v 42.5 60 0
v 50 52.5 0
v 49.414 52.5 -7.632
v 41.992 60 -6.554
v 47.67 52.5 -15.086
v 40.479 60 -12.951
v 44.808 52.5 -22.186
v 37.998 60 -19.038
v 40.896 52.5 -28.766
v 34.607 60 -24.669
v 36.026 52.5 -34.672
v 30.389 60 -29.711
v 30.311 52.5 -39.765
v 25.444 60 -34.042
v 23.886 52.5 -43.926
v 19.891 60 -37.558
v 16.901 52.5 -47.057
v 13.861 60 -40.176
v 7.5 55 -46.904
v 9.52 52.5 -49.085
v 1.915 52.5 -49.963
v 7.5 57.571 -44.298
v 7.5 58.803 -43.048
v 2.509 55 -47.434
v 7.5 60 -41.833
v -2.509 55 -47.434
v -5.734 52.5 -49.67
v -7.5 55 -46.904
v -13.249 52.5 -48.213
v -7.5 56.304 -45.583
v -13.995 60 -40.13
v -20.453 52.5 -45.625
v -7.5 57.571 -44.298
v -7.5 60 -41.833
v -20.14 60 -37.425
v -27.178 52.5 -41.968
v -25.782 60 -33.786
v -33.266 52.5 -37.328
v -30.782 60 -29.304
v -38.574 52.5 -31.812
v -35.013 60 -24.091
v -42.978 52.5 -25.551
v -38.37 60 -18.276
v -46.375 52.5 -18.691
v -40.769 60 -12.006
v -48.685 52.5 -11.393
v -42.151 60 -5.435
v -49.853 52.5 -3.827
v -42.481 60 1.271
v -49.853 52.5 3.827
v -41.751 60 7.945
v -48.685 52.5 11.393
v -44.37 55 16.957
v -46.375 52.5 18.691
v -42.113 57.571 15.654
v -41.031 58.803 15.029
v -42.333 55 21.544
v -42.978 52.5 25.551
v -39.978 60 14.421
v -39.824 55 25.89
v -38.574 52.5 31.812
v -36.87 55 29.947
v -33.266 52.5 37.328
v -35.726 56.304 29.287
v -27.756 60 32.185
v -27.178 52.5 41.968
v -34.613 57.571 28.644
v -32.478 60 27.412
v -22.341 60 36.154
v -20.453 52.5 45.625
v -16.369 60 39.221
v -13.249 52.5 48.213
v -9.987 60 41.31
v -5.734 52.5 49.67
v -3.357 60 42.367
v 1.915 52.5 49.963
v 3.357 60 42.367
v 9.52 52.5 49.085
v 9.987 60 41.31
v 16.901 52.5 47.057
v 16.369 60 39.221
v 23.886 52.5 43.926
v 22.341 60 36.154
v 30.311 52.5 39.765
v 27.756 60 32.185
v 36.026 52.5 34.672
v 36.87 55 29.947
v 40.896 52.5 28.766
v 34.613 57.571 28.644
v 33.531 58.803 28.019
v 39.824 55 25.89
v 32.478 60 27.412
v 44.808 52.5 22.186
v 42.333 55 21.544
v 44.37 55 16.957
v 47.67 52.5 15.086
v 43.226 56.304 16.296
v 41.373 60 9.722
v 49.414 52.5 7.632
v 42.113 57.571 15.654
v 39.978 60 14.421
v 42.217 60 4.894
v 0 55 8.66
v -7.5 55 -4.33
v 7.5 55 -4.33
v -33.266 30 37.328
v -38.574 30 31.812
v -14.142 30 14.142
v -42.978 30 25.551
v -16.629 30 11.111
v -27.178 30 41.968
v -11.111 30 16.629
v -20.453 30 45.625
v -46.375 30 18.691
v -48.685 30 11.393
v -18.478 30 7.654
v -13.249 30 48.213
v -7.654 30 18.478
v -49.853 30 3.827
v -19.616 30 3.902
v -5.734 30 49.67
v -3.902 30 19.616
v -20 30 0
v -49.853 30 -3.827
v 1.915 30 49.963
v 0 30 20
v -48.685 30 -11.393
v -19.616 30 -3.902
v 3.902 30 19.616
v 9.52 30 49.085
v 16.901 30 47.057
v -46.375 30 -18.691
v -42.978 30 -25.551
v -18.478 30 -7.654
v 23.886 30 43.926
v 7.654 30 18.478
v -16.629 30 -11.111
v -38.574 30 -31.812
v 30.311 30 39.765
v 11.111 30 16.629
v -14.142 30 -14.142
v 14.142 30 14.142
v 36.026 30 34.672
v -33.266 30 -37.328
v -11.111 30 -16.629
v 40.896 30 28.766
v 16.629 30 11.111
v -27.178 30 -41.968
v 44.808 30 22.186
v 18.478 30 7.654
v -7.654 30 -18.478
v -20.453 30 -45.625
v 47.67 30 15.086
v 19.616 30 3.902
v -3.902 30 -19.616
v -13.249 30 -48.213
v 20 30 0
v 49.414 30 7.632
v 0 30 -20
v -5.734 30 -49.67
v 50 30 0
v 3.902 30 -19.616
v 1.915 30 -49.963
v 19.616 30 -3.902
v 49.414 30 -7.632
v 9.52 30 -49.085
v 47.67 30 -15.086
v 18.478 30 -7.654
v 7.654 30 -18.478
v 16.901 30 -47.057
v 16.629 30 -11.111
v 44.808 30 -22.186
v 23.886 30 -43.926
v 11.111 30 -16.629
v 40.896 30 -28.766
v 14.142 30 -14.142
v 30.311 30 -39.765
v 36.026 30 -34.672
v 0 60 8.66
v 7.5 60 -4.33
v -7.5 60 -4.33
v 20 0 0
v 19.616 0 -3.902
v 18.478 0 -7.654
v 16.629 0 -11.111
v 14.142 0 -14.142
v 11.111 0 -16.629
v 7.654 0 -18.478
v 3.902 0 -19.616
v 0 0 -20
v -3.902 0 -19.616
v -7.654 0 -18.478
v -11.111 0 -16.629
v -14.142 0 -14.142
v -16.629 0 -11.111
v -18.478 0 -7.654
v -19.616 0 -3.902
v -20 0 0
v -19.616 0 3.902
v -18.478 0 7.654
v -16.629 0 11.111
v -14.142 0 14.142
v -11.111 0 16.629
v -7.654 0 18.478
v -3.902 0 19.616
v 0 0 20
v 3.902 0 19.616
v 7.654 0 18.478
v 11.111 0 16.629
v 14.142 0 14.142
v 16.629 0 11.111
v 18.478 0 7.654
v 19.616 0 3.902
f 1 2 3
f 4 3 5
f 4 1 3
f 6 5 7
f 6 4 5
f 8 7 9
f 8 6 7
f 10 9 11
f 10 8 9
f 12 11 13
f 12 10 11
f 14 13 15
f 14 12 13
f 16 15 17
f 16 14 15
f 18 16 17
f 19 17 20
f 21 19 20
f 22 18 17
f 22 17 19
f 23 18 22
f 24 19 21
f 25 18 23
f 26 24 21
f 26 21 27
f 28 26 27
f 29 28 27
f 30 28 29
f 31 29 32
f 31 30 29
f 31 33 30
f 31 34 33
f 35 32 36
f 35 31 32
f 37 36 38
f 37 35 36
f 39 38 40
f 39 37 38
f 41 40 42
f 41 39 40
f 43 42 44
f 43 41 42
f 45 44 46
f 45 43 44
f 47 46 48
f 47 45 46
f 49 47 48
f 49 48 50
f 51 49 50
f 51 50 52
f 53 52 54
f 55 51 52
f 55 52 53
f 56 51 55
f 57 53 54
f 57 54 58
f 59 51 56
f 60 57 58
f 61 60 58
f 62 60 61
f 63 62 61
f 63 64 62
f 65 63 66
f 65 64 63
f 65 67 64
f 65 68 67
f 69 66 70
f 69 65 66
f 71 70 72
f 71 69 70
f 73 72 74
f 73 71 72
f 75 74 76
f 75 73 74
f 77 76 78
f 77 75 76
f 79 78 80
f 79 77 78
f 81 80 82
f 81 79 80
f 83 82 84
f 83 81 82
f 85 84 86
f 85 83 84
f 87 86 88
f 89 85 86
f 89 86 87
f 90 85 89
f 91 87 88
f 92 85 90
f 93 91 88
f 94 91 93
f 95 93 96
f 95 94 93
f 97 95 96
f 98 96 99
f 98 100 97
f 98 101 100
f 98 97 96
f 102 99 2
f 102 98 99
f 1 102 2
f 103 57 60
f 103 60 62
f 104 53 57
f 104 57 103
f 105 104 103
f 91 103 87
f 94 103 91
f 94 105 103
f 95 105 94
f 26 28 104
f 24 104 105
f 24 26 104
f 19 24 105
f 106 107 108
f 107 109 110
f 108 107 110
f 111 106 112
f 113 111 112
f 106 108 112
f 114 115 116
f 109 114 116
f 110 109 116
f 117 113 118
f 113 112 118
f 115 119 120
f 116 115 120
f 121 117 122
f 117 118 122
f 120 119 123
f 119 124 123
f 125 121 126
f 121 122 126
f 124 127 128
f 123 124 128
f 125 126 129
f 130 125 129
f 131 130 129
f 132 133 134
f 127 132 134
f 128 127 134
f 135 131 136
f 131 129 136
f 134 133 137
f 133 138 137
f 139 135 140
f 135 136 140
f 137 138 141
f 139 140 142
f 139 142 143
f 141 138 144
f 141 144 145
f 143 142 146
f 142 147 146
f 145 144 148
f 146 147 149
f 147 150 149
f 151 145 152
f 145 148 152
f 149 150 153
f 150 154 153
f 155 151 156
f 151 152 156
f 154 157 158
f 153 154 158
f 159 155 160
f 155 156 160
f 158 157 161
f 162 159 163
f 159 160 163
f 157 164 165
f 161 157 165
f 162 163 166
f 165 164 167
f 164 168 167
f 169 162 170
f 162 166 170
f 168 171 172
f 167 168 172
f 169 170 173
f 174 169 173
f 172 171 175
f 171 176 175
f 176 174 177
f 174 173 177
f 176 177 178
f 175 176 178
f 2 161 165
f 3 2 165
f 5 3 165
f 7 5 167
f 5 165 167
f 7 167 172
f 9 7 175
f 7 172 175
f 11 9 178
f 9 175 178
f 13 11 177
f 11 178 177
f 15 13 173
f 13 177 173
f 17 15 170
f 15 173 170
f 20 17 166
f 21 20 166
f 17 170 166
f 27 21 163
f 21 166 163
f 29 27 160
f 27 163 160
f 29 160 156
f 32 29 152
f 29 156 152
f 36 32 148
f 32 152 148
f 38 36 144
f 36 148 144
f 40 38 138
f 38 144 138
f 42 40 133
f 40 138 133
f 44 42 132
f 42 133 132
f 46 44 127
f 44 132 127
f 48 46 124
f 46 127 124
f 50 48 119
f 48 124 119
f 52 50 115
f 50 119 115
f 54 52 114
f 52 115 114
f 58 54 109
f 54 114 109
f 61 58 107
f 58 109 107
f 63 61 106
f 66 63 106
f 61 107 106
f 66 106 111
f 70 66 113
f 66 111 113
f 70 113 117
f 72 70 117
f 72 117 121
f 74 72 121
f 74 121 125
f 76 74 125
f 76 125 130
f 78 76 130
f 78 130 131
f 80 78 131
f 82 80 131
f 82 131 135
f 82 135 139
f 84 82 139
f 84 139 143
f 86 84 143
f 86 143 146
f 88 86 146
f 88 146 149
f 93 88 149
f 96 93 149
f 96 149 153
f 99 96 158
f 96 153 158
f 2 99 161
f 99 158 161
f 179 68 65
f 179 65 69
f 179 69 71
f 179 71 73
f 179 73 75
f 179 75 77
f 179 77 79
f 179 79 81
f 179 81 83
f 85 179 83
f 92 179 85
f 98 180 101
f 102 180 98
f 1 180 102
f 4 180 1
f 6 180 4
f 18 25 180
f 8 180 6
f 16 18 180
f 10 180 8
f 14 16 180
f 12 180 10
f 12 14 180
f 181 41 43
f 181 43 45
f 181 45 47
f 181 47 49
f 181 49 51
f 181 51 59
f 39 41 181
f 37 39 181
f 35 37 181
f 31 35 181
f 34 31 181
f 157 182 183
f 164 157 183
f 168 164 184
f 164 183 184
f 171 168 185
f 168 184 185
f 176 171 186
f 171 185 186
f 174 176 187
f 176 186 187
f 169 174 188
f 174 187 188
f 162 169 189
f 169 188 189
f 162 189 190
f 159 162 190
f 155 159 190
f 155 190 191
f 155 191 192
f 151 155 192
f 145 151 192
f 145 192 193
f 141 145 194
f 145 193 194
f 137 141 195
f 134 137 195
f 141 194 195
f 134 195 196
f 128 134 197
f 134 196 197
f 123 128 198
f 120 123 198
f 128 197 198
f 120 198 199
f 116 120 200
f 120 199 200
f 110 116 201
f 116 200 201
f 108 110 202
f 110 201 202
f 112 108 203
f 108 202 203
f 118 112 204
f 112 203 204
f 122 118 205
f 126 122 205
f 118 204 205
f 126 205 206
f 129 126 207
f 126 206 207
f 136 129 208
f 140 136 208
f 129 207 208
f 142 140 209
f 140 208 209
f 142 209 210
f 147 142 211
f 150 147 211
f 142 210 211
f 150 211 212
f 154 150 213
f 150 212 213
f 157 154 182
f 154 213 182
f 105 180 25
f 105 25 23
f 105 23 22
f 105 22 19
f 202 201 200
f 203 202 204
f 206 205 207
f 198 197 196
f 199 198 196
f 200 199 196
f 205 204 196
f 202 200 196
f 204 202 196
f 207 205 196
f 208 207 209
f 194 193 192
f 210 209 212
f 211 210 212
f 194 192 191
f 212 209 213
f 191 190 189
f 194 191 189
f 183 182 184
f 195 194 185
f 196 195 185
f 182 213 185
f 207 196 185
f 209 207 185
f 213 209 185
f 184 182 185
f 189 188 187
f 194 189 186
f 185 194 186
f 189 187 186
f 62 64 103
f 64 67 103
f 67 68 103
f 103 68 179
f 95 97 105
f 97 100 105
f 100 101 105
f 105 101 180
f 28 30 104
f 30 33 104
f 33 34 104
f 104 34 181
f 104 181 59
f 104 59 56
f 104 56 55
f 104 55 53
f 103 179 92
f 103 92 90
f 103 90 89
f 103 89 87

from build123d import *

# Parameters (mm, degrees)
SKETCH1_R           = 20
BOSS_EXTRUDE1_DEPTH = 30
SKETCH2_R           = 50
BOSS_EXTRUDE2_DEPTH = 30
CHAMFER1_SIZE       = 7.5
CUT_EXTRUDE1_DEPTH  = 5


with BuildPart() as part:
    # Sketch1 → Boss-Extrude1 (new body)
    with BuildSketch(Plane(origin=(0, 0, 0), x_dir=(1, 0, 0), z_dir=(0, 1, 0))):
        Circle(SKETCH1_R)
    extrude(amount=BOSS_EXTRUDE1_DEPTH)

    # Sketch2 → Boss-Extrude2 (add)
    with BuildSketch(Plane(origin=(0, 30, 0), x_dir=(1, 0, 0), z_dir=(0, 1, 0))):
        Circle(SKETCH2_R)
    extrude(amount=BOSS_EXTRUDE2_DEPTH)

    # Chamfer1
    chamfer1_edges = [part.edges().sort_by_distance(p)[0] for p in [
        (-50, 60, 0),
    ]]
    chamfer(chamfer1_edges, length=CHAMFER1_SIZE)

    # Sketch3 → Cut-Extrude1 (cut)
    with BuildSketch(Plane(origin=(0, 60, 0), x_dir=(1, 0, 0), z_dir=(0, 1, 0))):
        with BuildLine():
            Line((47.051270189, -18.504809472), (7.5, 4.330127019))
            Line((7.5, 4.330127019), (7.5, 50))
            ThreePointArc((7.5, 50), (0, 57.5), (-7.5, 50))
            Line((-7.5, 50), (-7.5, 4.330127019))
            Line((-7.5, 4.330127019), (-47.051270189, -18.504809472))
            ThreePointArc((-47.051270189, -18.504809472), (-49.796460718, -28.75), (-39.551270189, -31.495190528))
            Line((-39.551270189, -31.495190528), (0, -8.660254038))
            Line((0, -8.660254038), (39.551270189, -31.495190528))
            ThreePointArc((39.551270189, -31.495190528), (49.796460718, -28.75), (47.051270189, -18.504809472))
        make_face()
    extrude(amount=-CUT_EXTRUDE1_DEPTH, mode=Mode.SUBTRACT)


solid = part.part
